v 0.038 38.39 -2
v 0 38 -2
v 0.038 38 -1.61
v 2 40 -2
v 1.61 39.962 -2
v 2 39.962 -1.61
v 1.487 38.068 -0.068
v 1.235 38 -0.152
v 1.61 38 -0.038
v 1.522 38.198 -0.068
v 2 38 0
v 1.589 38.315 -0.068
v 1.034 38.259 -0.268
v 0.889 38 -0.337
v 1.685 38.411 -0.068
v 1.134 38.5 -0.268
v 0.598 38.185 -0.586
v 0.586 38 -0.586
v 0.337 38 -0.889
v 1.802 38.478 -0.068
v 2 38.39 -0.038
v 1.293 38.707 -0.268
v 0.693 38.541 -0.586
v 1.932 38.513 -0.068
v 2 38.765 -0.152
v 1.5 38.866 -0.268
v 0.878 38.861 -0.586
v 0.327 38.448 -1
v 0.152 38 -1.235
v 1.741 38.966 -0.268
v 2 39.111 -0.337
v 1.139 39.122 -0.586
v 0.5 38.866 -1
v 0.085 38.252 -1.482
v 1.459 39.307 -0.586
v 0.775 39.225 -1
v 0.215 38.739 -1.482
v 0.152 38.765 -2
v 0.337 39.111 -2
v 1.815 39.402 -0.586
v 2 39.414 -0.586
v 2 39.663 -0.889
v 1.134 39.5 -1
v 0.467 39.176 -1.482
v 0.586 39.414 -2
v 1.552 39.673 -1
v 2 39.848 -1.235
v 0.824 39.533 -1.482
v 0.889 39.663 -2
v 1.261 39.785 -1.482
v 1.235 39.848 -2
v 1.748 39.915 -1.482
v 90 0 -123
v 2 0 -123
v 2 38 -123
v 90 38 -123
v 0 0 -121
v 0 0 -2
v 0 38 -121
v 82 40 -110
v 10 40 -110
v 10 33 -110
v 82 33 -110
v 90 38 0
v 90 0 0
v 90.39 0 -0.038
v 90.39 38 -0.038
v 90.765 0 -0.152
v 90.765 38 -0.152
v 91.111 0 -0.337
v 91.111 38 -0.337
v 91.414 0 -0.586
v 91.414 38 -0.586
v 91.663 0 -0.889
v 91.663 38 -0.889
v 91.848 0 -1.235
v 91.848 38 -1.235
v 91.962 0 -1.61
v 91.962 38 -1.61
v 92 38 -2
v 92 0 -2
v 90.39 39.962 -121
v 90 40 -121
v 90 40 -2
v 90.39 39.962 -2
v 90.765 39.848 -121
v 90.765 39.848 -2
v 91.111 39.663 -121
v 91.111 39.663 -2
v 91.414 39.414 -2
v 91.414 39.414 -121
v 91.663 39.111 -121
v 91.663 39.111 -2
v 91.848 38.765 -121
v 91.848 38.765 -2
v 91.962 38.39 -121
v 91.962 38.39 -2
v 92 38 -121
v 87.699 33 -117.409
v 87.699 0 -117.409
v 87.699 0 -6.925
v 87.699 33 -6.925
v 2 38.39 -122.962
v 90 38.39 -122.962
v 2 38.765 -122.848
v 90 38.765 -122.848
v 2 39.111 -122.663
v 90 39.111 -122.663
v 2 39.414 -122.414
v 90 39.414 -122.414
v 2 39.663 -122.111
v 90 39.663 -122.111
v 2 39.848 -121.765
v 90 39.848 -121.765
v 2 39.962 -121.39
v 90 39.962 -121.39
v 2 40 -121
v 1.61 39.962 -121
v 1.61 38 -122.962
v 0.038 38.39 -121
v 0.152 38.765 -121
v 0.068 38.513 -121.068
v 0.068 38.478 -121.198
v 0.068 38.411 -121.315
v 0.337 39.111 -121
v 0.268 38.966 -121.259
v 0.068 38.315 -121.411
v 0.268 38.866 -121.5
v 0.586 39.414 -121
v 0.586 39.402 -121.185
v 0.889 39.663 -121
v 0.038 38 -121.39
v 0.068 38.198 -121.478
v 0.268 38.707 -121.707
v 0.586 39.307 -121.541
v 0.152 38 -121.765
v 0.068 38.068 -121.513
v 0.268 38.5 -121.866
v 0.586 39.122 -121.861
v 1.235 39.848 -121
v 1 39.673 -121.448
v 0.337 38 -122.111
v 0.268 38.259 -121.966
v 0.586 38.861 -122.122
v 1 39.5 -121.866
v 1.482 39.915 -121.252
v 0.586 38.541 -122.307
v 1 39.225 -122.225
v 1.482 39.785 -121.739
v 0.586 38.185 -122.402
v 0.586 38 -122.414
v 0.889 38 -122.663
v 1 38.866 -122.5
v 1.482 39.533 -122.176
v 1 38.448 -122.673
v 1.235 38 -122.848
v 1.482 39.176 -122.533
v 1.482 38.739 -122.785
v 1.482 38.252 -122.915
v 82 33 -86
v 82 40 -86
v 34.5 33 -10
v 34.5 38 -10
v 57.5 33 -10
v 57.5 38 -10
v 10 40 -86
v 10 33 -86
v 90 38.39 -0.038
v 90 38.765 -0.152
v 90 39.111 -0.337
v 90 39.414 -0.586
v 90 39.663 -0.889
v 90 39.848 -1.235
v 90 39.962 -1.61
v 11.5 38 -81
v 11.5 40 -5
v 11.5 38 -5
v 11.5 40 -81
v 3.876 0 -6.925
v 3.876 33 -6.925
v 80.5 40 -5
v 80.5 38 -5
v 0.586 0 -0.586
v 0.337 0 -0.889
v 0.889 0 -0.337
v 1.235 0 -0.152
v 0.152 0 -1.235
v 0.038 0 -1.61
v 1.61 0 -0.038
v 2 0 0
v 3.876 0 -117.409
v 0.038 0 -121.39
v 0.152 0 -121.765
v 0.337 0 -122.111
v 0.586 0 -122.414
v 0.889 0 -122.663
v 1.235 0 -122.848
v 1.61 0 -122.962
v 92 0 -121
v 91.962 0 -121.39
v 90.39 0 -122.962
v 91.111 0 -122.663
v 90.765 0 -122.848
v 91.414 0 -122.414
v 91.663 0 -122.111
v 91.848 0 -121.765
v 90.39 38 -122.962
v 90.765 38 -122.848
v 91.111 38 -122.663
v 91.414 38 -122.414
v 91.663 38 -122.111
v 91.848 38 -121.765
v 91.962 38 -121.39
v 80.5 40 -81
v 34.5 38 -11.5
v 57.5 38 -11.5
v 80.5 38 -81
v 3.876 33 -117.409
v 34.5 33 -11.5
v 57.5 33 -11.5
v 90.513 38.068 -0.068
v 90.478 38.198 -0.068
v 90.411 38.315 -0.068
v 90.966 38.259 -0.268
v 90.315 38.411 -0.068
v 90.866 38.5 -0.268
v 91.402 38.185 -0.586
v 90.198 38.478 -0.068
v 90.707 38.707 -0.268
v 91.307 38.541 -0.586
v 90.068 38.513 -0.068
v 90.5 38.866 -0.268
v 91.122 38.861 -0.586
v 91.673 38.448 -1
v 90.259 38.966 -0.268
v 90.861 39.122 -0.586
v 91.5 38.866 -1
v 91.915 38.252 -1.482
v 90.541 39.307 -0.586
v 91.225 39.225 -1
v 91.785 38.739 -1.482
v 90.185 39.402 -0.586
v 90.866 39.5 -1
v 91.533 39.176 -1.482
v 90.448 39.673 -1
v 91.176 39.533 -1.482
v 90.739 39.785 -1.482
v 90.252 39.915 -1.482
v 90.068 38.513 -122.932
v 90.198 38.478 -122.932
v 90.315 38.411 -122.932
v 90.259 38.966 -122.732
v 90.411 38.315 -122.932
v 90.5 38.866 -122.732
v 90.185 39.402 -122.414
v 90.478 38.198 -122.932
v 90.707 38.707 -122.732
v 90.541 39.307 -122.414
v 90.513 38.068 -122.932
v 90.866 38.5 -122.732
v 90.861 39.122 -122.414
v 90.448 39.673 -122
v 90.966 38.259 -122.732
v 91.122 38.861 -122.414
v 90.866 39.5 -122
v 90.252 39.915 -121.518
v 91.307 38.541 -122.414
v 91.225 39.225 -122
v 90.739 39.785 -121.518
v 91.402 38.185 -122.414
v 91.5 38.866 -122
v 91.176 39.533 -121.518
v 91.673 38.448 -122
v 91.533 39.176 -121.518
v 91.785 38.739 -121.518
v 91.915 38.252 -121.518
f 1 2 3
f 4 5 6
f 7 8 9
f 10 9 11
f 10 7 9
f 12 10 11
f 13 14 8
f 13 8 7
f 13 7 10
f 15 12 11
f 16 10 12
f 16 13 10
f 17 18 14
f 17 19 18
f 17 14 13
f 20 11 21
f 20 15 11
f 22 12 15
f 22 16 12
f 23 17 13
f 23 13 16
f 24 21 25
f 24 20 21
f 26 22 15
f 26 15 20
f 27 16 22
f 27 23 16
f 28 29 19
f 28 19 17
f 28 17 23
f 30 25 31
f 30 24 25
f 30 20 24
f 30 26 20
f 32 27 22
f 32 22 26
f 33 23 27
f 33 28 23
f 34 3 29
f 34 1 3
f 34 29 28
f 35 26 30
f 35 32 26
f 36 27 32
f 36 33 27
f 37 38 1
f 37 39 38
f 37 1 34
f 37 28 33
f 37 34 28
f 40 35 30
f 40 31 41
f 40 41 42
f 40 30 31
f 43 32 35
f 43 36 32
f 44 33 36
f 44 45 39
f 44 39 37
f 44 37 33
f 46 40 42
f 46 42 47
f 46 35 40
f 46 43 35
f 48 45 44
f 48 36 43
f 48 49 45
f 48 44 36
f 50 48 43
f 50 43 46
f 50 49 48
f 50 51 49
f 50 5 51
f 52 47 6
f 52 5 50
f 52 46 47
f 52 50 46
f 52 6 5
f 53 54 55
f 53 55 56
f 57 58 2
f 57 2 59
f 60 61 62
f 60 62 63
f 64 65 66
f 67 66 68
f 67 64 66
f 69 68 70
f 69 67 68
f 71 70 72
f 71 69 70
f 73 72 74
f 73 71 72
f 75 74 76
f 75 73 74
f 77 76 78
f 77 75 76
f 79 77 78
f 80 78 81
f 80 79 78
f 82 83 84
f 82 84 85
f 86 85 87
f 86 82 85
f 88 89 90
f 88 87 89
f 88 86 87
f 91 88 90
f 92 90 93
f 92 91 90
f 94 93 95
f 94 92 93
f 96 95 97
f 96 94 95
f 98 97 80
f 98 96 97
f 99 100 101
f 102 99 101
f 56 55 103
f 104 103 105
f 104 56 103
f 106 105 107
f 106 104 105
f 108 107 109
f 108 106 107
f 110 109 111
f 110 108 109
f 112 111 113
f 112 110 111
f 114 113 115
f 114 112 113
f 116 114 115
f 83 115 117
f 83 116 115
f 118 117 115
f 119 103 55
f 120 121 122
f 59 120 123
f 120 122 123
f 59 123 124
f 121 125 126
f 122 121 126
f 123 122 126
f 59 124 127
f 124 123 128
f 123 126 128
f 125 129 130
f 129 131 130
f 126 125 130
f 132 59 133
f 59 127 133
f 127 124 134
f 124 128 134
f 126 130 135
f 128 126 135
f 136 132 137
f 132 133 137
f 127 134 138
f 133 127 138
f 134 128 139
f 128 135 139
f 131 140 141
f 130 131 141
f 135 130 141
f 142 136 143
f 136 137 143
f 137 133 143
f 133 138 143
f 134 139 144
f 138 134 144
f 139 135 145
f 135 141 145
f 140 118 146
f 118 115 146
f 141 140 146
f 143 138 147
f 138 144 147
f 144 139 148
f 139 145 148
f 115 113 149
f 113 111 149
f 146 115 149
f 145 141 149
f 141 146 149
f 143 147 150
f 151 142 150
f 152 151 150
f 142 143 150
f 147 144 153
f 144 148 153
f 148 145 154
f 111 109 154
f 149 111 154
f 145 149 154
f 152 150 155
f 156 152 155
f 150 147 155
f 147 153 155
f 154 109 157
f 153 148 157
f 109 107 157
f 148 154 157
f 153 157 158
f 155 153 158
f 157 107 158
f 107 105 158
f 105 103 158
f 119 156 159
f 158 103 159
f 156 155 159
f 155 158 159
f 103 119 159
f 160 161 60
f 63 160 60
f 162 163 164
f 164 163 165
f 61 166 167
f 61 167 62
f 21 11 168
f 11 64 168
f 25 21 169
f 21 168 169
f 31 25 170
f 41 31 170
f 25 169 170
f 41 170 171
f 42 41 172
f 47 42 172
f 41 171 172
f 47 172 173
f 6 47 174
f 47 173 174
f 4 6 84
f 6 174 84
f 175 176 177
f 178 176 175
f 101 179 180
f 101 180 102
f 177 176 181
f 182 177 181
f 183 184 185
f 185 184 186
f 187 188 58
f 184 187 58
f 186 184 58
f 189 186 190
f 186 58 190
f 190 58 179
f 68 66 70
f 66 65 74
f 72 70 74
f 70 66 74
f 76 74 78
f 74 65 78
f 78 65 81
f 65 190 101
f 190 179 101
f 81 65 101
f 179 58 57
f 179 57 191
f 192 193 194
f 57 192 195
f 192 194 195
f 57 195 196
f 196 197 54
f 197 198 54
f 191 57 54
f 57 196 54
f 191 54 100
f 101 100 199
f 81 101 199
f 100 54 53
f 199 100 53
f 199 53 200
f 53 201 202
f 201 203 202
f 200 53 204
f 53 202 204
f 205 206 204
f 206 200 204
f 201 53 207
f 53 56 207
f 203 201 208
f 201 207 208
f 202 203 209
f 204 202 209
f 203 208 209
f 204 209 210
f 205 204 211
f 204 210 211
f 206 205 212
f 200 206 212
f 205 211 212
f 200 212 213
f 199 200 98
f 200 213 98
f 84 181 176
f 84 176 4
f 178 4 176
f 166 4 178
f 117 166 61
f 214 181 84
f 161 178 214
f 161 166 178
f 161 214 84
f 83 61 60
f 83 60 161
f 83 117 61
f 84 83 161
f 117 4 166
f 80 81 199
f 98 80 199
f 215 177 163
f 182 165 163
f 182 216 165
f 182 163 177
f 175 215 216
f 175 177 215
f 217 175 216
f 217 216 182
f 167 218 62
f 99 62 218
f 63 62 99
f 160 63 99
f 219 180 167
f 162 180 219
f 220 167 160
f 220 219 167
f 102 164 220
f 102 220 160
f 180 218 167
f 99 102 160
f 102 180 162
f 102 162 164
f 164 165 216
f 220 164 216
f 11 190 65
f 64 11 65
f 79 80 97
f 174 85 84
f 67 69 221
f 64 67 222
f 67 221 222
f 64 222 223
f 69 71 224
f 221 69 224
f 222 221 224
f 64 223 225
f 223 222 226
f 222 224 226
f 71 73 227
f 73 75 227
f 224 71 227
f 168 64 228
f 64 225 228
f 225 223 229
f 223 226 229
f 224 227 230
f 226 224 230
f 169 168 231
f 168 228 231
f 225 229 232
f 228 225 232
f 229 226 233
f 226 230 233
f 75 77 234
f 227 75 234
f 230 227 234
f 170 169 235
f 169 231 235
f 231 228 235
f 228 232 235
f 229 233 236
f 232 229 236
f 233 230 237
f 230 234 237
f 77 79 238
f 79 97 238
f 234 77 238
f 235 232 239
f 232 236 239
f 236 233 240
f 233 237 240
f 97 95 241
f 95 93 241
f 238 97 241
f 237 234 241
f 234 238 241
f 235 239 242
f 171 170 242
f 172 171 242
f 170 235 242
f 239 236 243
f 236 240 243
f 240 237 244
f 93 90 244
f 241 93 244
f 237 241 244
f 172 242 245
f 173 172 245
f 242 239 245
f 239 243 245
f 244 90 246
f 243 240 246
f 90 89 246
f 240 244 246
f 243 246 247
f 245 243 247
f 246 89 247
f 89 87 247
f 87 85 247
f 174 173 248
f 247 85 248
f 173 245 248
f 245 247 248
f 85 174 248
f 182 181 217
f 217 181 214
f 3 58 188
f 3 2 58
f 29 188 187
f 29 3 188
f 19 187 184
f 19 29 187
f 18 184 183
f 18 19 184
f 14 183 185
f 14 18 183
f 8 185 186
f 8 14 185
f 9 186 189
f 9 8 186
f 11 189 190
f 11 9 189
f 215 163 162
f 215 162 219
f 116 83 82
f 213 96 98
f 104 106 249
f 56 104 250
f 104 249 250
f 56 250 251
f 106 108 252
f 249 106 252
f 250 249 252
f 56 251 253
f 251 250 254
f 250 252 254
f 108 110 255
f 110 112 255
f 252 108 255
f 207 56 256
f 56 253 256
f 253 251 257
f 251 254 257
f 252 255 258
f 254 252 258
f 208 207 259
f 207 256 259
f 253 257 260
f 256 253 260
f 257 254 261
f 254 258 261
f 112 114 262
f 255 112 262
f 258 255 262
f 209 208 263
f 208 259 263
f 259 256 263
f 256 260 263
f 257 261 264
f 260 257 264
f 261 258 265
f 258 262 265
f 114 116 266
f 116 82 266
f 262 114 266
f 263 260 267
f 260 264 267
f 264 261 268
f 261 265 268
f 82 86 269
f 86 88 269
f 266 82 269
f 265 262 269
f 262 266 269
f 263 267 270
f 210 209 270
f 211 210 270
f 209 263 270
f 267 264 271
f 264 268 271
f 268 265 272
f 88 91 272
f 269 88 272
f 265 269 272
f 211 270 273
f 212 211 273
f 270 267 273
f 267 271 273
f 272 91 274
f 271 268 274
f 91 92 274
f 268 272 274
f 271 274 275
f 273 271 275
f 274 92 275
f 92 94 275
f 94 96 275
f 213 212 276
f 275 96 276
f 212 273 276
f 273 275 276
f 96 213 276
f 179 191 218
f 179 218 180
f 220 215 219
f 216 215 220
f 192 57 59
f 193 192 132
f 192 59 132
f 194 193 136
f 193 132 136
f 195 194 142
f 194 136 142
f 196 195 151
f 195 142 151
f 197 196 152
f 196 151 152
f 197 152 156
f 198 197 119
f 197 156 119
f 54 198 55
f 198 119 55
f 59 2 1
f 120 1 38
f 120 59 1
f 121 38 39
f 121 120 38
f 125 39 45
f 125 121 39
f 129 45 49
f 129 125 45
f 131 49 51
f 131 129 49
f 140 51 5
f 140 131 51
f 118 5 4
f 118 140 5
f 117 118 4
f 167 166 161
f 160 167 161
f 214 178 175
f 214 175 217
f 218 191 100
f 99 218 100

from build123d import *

# Parameters (mm, degrees)
SKETCH1_W           = 92
SKETCH1_H           = 123
BOSS_EXTRUDE1_DEPTH = 40
SKETCH2_W           = 72
SKETCH2_H           = 24
CUT_EXTRUDE1_DEPTH  = 159.723029205
SKETCH3_W           = 69
SKETCH3_H           = 76
CUT_EXTRUDE2_DEPTH  = 2
SKETCH5_W           = 23
SKETCH5_H           = 1.5
CUT_EXTRUDE4_DEPTH  = 159.230844022
FILLET1_R           = 2
SHELL10_START       = 7
SHELL10_DEPTH       = 24
SKETCH8_W           = 83.82309106
SKETCH8_H           = 110.483157271
CUT_EXTRUDE6_DEPTH  = 33


# Read off the part's stored shape, not the designer's step: Shell10
with BuildPart() as part:
    # Sketch1 → Boss-Extrude1 (new body)
    with BuildSketch(Plane(origin=(0, 0, 0), x_dir=(1, 0, 0), z_dir=(0, 1, 0))):
        with Locations((46, 61.5)):
            Rectangle(SKETCH1_W, SKETCH1_H)
    extrude(amount=BOSS_EXTRUDE1_DEPTH)

    # Sketch2 → Cut-Extrude1 (cut, through all)
    with BuildSketch(Plane(origin=(0, 40, 0), x_dir=(1, 0, 0), z_dir=(0, 1, 0))):
        with Locations((46, 98)):
            Rectangle(SKETCH2_W, SKETCH2_H)
    extrude(amount=-CUT_EXTRUDE1_DEPTH, mode=Mode.SUBTRACT)

    # Sketch3 → Cut-Extrude2 (cut)
    with BuildSketch(Plane(origin=(0, 40, 0), x_dir=(1, 0, 0), z_dir=(0, 1, 0))):
        with Locations((46, 43)):
            Rectangle(SKETCH3_W, SKETCH3_H)
    extrude(amount=-CUT_EXTRUDE2_DEPTH, mode=Mode.SUBTRACT)

    # Sketch5 → Cut-Extrude4 (cut, through all)
    with BuildSketch(Plane(origin=(0, 38, 0), x_dir=(1, 0, 0), z_dir=(0, 1, 0))):
        with Locations((46, 10.75)):
            Rectangle(SKETCH5_W, SKETCH5_H)
    extrude(amount=-CUT_EXTRUDE4_DEPTH, mode=Mode.SUBTRACT)

    # Fillet1
    fillet1_edges = [part.edges().sort_by_distance(p)[0] for p in [
        (92, 40, -61.5),
        (46, 40, -123),
        (0, 40, -61.5),
        (0, 20, -123),
        (92, 20, -123),
        (92, 20, 0),
        (0, 20, 0),
        (46, 40, 0),
    ]]
    fillet(fillet1_edges, radius=FILLET1_R)

    # Shell10 outline → Shell10 (cut)
    with BuildSketch(Plane(origin=(0, 0, 0), x_dir=(1, 0, 0), z_dir=(0, 1, 0)).offset(SHELL10_START)):
        Polygon((7, 7), (27.5, 7), (27.5, 18.5), (64.5, 18.5), (64.5, 7), (85, 7), (85, 79), (7, 79), align=None)
    extrude(amount=SHELL10_DEPTH, mode=Mode.SUBTRACT)

    # Sketch8 → Cut-Extrude6 (cut)
    with BuildSketch(Plane.XZ):
        with Locations((45.787286948, -62.167007368)):
            Rectangle(SKETCH8_W, SKETCH8_H)
    extrude(amount=-CUT_EXTRUDE6_DEPTH, mode=Mode.SUBTRACT)


solid = part.part
